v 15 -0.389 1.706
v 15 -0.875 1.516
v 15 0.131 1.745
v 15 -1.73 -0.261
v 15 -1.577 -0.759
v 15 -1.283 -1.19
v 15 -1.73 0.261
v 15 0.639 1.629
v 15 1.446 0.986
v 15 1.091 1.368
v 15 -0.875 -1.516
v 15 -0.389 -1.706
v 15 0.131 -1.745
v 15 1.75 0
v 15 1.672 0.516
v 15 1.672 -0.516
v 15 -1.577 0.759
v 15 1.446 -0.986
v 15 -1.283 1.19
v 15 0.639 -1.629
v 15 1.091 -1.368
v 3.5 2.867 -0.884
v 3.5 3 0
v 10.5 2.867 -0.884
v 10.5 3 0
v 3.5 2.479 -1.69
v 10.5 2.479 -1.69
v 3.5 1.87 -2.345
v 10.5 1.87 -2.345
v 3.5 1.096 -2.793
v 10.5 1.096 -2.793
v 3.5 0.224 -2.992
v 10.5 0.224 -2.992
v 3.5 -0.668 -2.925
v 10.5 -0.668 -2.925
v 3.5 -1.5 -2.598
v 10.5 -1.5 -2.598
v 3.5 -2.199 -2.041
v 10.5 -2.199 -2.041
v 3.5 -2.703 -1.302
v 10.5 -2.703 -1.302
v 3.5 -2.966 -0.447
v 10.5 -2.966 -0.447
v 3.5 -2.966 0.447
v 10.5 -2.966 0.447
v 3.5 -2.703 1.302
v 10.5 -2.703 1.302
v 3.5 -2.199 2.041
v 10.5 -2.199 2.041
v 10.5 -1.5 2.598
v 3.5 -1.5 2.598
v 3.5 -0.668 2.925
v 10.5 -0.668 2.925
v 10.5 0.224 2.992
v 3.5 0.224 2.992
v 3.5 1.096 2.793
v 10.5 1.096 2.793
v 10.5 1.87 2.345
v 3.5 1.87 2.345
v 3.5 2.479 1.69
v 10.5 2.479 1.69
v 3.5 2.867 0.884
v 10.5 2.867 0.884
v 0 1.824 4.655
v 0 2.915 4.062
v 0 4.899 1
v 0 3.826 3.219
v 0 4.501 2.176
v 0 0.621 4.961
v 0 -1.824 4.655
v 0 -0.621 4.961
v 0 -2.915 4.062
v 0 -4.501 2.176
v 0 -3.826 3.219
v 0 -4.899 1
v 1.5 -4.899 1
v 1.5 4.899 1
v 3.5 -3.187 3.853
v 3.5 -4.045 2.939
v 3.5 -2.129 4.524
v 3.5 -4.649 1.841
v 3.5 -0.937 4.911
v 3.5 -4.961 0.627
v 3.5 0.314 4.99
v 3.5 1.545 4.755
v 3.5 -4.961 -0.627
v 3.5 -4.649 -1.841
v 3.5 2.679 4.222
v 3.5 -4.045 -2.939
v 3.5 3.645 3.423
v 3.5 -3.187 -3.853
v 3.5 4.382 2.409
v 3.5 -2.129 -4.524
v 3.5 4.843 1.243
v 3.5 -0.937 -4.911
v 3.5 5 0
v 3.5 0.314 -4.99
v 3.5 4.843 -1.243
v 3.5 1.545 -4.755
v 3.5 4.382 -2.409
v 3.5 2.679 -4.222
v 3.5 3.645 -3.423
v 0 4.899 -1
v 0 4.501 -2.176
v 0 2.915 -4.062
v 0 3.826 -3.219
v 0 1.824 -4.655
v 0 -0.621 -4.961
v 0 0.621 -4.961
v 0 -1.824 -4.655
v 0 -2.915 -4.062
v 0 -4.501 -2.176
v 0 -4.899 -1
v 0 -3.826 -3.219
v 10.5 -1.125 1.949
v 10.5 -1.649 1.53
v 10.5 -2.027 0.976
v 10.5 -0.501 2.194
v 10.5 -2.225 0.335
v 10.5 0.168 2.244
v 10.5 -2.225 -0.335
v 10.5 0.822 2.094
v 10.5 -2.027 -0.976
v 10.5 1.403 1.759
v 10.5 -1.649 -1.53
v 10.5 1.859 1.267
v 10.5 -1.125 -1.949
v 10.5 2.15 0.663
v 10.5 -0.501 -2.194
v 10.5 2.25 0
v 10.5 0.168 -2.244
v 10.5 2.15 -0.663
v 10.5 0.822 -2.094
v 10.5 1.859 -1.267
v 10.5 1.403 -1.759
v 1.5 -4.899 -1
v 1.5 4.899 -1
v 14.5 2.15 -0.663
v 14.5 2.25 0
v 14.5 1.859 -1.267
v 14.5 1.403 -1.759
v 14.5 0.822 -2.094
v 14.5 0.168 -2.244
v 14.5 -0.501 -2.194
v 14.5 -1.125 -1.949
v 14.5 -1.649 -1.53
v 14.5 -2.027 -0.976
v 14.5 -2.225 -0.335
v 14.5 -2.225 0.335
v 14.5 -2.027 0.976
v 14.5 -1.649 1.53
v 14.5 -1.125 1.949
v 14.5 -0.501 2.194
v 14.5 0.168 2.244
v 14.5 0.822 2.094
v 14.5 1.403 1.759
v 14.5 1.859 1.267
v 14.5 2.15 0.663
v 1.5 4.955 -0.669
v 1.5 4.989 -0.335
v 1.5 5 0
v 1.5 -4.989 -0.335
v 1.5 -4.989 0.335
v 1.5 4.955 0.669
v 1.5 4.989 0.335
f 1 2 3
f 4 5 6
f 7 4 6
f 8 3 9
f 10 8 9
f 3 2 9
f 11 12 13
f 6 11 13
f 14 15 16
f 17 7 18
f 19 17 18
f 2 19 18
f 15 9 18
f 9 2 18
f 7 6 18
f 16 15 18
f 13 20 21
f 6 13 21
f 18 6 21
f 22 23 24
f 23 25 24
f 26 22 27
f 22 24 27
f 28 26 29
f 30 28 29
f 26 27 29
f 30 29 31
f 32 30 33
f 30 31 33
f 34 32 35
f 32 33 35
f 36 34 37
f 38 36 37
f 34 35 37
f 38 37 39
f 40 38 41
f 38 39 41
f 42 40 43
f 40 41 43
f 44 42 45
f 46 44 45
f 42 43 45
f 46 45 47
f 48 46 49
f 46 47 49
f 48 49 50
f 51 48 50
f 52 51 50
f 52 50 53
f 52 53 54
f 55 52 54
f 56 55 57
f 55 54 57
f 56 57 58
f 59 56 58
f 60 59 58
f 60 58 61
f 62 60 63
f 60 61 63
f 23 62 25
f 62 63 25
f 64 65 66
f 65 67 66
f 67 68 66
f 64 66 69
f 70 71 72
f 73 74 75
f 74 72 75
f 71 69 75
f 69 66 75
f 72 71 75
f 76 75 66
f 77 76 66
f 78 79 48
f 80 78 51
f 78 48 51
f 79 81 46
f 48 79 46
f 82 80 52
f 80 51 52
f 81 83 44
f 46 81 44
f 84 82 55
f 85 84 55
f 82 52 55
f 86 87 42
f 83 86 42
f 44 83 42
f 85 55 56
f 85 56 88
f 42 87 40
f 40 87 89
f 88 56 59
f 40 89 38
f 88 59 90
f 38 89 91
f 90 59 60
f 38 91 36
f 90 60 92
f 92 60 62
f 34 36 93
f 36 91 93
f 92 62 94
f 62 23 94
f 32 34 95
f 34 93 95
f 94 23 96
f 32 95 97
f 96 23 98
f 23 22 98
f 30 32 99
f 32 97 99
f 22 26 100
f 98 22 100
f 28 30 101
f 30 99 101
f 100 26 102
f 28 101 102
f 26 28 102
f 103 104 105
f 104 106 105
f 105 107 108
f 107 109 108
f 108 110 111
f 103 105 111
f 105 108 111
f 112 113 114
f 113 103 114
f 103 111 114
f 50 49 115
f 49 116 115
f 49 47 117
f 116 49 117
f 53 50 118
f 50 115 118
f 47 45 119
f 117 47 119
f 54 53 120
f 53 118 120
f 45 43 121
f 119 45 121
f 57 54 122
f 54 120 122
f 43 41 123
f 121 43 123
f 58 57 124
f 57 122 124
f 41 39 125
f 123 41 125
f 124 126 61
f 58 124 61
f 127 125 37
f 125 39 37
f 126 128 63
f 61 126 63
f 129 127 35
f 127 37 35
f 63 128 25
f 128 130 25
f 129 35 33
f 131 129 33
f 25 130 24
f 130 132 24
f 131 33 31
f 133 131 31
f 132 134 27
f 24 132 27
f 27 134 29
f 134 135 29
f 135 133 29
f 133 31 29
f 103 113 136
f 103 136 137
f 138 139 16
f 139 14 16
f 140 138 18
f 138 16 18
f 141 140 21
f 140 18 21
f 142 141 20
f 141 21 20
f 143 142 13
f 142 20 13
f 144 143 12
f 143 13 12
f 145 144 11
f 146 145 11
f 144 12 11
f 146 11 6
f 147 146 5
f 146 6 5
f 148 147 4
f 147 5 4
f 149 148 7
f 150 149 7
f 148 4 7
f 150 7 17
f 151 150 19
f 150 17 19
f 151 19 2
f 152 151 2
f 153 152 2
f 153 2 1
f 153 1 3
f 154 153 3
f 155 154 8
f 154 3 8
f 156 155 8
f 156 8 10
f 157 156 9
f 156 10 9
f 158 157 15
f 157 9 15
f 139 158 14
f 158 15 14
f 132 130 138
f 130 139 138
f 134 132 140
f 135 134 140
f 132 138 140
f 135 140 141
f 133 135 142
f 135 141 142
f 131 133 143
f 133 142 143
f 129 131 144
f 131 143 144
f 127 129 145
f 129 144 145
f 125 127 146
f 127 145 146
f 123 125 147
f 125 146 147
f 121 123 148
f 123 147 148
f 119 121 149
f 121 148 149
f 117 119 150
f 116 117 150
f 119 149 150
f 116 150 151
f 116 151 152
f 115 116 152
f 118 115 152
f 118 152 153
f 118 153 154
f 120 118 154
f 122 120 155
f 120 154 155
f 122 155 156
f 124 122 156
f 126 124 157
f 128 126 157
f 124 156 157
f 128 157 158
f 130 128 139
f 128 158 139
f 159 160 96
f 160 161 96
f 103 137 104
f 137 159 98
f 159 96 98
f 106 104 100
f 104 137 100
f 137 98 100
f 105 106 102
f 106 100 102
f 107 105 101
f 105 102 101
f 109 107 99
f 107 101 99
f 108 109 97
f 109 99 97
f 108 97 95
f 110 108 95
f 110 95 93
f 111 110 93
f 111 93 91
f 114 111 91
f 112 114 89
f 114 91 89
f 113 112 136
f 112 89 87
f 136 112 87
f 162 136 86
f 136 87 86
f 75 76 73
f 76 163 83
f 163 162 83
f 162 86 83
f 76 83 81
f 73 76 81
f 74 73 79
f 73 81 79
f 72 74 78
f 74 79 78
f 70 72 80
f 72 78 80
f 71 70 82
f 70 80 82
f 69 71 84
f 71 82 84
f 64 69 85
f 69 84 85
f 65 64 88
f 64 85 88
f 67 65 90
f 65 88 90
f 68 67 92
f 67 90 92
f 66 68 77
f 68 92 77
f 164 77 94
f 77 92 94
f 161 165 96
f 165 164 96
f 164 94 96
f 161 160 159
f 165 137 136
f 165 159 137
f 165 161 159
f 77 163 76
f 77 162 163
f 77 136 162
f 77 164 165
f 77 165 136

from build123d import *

# Parameters (mm, degrees)
ESQUISSE2_W             = 2
ESQUISSE2_H             = 12.833084331
ENL_V_MAT_EXTRU_1_DEPTH = 1.5


with BuildPart() as part:
    # Esquisse1 → Révolution1 (revolve)
    with BuildSketch(Plane.XY):
        Polygon((0, 0), (0, 5), (3.5, 5), (3.5, 3), (10.5, 3), (10.5, 2.25), (14.5, 2.25), (15, 1.75), (15, 0), align=None)
    revolve(axis=Axis((15, 0, 0), (-1, 0, 0)))

    # Esquisse2 → Enlèv. mat.-Extru.1 (cut)
    with BuildSketch(Plane.ZY):
        with Locations((0, -0.051559527)):
            Rectangle(ESQUISSE2_W, ESQUISSE2_H)
    extrude(amount=-ENL_V_MAT_EXTRU_1_DEPTH, mode=Mode.SUBTRACT)


solid = part.part
